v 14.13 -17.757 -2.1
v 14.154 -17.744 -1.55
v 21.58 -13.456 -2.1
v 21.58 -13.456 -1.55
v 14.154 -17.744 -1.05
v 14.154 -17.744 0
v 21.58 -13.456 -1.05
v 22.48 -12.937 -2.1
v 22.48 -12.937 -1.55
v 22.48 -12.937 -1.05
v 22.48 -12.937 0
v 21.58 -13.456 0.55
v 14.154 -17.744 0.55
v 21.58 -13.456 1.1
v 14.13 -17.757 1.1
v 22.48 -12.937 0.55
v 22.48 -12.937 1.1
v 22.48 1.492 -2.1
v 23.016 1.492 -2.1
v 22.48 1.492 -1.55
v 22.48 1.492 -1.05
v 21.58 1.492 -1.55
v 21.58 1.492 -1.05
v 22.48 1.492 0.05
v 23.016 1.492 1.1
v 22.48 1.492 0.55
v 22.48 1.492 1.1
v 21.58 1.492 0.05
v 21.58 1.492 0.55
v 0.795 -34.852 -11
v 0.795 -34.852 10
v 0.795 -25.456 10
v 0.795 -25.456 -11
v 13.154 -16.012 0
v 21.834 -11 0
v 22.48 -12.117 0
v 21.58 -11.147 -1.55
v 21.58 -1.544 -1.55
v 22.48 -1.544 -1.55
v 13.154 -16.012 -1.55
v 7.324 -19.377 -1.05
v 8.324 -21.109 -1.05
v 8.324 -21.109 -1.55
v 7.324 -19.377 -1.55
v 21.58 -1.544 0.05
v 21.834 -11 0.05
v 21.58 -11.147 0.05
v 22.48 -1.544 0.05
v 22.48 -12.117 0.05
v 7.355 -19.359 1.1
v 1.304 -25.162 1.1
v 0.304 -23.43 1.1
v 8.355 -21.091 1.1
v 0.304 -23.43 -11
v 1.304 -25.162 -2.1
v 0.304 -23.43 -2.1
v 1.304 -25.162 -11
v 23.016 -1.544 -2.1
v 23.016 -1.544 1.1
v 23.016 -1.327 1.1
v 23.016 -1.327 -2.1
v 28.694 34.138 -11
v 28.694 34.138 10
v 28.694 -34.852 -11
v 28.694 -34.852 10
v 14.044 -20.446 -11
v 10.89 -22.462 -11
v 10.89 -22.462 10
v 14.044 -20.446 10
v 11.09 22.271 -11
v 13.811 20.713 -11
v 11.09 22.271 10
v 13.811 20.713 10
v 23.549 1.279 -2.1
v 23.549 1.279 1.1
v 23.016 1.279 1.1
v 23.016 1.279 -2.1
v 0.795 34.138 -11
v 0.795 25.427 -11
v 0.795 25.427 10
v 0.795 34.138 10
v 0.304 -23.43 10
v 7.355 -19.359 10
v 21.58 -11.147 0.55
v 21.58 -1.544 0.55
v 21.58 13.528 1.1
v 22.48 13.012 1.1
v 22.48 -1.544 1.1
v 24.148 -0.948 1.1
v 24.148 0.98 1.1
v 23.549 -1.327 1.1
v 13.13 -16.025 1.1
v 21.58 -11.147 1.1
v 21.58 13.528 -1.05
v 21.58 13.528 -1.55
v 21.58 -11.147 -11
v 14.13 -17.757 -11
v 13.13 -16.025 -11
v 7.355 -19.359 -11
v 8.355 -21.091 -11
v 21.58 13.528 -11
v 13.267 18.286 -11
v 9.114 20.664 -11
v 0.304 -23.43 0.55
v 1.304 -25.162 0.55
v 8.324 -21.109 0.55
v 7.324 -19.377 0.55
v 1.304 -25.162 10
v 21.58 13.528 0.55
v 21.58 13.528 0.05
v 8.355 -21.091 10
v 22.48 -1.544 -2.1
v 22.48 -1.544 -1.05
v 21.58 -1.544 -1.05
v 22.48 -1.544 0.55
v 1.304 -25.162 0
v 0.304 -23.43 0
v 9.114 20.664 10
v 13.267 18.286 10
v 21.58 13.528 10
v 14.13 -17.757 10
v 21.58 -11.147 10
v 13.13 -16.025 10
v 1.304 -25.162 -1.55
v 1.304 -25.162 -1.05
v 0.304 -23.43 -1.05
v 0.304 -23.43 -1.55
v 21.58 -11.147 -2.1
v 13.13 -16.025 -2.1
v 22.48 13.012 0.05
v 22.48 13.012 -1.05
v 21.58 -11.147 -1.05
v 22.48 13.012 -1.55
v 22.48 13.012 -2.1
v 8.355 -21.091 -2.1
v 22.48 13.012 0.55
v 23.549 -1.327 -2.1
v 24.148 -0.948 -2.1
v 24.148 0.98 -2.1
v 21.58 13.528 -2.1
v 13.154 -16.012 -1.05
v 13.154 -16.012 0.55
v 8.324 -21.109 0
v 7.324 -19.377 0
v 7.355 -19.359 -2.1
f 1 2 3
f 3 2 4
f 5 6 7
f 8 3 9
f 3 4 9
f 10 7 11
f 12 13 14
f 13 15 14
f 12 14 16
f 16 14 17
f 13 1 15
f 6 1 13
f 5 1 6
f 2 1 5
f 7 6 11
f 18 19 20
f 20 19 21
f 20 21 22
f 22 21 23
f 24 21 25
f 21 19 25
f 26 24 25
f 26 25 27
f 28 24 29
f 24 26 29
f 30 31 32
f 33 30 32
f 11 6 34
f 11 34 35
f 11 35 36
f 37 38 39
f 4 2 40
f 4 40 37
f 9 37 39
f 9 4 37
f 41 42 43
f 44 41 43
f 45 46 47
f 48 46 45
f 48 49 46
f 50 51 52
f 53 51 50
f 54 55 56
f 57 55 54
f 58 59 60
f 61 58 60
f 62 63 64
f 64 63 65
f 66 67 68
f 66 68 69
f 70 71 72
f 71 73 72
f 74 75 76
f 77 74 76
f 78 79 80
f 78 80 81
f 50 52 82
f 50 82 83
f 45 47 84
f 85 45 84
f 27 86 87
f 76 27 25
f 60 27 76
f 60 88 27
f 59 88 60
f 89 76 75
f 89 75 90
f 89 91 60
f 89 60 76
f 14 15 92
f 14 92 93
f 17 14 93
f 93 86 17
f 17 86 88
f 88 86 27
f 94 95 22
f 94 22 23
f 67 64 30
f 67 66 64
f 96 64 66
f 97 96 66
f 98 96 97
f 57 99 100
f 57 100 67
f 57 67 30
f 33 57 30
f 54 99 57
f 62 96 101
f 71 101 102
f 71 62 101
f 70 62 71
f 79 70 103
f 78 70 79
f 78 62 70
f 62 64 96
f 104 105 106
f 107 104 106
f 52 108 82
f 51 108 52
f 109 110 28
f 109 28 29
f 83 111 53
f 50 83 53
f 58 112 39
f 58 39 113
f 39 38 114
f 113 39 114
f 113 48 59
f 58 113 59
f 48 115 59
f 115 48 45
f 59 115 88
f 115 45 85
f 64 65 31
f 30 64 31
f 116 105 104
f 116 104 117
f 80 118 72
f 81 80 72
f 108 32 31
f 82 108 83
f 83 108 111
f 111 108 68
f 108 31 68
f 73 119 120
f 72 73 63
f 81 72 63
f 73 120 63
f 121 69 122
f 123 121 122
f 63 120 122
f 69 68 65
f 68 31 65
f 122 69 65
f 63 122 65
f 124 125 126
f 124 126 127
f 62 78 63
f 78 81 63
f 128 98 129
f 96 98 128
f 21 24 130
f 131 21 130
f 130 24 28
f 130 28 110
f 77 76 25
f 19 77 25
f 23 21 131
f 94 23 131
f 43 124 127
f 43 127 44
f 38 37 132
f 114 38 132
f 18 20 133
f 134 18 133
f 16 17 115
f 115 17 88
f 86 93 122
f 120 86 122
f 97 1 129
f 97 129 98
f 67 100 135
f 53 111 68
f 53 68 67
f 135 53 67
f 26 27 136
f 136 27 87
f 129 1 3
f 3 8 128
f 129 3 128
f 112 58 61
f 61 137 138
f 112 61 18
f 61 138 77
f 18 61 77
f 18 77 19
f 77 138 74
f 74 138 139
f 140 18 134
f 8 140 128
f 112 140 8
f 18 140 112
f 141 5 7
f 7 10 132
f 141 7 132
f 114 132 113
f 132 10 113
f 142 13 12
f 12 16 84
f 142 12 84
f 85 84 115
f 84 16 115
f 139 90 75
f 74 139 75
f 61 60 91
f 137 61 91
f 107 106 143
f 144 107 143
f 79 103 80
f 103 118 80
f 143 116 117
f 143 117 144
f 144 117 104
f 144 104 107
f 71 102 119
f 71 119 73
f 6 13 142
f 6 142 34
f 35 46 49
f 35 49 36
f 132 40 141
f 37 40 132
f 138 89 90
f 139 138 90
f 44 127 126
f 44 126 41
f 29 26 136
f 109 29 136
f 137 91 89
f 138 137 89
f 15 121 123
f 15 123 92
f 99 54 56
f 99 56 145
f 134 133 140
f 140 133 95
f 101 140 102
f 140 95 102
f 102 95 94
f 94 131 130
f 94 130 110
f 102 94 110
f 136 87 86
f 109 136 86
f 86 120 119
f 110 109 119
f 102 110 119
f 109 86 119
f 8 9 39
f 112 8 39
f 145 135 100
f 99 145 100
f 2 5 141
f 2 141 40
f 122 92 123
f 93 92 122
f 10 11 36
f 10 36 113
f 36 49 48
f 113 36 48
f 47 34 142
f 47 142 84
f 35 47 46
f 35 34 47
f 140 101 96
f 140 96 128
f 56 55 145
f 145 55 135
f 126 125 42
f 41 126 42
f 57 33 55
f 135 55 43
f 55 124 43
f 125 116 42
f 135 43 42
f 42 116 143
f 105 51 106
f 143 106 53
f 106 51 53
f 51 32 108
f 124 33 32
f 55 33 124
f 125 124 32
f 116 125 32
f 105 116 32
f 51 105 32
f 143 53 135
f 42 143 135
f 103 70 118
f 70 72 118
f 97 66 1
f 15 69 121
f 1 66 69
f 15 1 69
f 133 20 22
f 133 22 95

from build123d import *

# Parameters (mm, degrees)
BOSS_EXTRUDE1_DEPTH      = 10
BOSS_EXTRUDE1_DEPTH_BACK = 11
SKETCH2_W                = 0.5
SKETCH2_H                = 33.789751219
SKETCH2_W_2              = 8.9
SKETCH2_H_2              = 33.710181146
BOSS_EXTRUDE2_DEPTH      = 0.9
SKETCH4_W                = 3.2
SKETCH4_H                = 3.035313039
CUT_EXTRUDE1_DEPTH       = 0.9
SKETCH5_W                = 8.9
SKETCH5_H                = 5.924846374
SKETCH5_H_2              = 8.259633143
BOSS_EXTRUDE3_DEPTH      = 3.9
SKETCH6_W                = 10.051459914
SKETCH6_H                = 8.9
SKETCH6_W_2              = 8.141320355
SKETCH6_W_3              = 10.023699464
SKETCH6_H_2              = 0.55
SKETCH6_H_3              = 0.5
SKETCH6_W_4              = 8.105756988
BOSS_EXTRUDE4_DEPTH      = 2


with BuildPart() as part:
    # Sketch1 → Boss-Extrude1 (new body, two sides)
    with BuildSketch(Plane.XY) as boss_extrude1_sk:
        Polygon((0.795322437, -25.455965093), (8.355079741, -21.091337178), (10.890469069, -22.462482859), (14.044123283, -20.446434454), (14.129516604, -17.757464501), (22.479597834, -12.936542855), (22.479597834, -1.543644942), (23.016460709, -1.543644942), (23.016460709, -1.327475501), (23.549450475, -1.327475501), (24.148188576, -0.947681864), (24.148188576, 0.979689608), (23.549450475, 1.278840764), (23.016460709, 1.278840764), (23.016460709, 1.491668097), (22.479597834, 1.491668097), (22.479597834, 13.01230949), (13.267337289, 18.286375916), (13.8113599, 20.713241045), (11.090051556, 22.271204034), (9.1144107, 20.663947694), (0.795322437, 25.426668406), (0.795322437, 34.137830746), (28.694115234, 34.137830746), (28.694115234, -34.851518664), (0.795322437, -34.851518664), align=None)
    extrude(amount=BOSS_EXTRUDE1_DEPTH)
    extrude(boss_extrude1_sk.sketch, amount=-BOSS_EXTRUDE1_DEPTH_BACK)

    # Sketch2 → Boss-Extrude2 (add)
    with BuildSketch(Plane.ZY.offset(-22.479597834)):
        with Locations((-1.3, 1.391500307)):
            Rectangle(SKETCH2_W, SKETCH2_H)
        with Locations((-6.55, 1.391500307)):
            Rectangle(SKETCH2_W_2, SKETCH2_H)
        with Locations((5.55, 1.431285343)):
            Rectangle(SKETCH2_W_2, SKETCH2_H_2)
        with Locations((0.3, 1.431285343)):
            Rectangle(SKETCH2_W, SKETCH2_H_2)
    extrude(amount=BOSS_EXTRUDE2_DEPTH)

    # Sketch4 → Cut-Extrude1 (cut)
    with BuildSketch(Plane.ZY.offset(-21.579597834)):
        with Locations((-0.5, -0.025988422)):
            Rectangle(SKETCH4_W, SKETCH4_H)
    extrude(amount=-CUT_EXTRUDE1_DEPTH, mode=Mode.SUBTRACT)

    # Sketch5 → Boss-Extrude3 (add)
    with BuildSketch(Plane.ZY.offset(-21.579597834)):
        with Locations((5.55, -0.357470261)):
            Rectangle(SKETCH5_W, SKETCH5_H)
        with Locations((-6.55, -0.62015136)):
            Rectangle(SKETCH5_W, SKETCH5_H_2)
    extrude(amount=-BOSS_EXTRUDE3_DEPTH)

    # Sketch6 → Boss-Extrude4 (add)
    with BuildSketch(Plane(origin=(11.221586833, -19.436358537, 0), x_dir=(0.866025404, 0.5, 0), z_dir=(-0.5, 0.866025404, 0))):
        with Locations((8.383518028, -5.55)):
            Rectangle(SKETCH6_W, SKETCH6_H)
        with Locations((8.383518028, 6.55)):
            Rectangle(SKETCH6_W, SKETCH6_H)
        with Locations((-7.38061746, -5.55)):
            Rectangle(SKETCH6_W_2, SKETCH6_H)
        with Locations((8.397398253, -0.275)):
            Rectangle(SKETCH6_W_3, SKETCH6_H_2)
        with Locations((8.397398253, 1.3)):
            Rectangle(SKETCH6_W_3, SKETCH6_H_3)
        with Locations((-7.398399144, -0.275)):
            Rectangle(SKETCH6_W_4, SKETCH6_H_2)
        with Locations((-7.398399144, 1.3)):
            Rectangle(SKETCH6_W_4, SKETCH6_H_3)
        with Locations((-7.38061746, 6.55)):
            Rectangle(SKETCH6_W_2, SKETCH6_H)
    extrude(amount=BOSS_EXTRUDE4_DEPTH)


solid = part.part
